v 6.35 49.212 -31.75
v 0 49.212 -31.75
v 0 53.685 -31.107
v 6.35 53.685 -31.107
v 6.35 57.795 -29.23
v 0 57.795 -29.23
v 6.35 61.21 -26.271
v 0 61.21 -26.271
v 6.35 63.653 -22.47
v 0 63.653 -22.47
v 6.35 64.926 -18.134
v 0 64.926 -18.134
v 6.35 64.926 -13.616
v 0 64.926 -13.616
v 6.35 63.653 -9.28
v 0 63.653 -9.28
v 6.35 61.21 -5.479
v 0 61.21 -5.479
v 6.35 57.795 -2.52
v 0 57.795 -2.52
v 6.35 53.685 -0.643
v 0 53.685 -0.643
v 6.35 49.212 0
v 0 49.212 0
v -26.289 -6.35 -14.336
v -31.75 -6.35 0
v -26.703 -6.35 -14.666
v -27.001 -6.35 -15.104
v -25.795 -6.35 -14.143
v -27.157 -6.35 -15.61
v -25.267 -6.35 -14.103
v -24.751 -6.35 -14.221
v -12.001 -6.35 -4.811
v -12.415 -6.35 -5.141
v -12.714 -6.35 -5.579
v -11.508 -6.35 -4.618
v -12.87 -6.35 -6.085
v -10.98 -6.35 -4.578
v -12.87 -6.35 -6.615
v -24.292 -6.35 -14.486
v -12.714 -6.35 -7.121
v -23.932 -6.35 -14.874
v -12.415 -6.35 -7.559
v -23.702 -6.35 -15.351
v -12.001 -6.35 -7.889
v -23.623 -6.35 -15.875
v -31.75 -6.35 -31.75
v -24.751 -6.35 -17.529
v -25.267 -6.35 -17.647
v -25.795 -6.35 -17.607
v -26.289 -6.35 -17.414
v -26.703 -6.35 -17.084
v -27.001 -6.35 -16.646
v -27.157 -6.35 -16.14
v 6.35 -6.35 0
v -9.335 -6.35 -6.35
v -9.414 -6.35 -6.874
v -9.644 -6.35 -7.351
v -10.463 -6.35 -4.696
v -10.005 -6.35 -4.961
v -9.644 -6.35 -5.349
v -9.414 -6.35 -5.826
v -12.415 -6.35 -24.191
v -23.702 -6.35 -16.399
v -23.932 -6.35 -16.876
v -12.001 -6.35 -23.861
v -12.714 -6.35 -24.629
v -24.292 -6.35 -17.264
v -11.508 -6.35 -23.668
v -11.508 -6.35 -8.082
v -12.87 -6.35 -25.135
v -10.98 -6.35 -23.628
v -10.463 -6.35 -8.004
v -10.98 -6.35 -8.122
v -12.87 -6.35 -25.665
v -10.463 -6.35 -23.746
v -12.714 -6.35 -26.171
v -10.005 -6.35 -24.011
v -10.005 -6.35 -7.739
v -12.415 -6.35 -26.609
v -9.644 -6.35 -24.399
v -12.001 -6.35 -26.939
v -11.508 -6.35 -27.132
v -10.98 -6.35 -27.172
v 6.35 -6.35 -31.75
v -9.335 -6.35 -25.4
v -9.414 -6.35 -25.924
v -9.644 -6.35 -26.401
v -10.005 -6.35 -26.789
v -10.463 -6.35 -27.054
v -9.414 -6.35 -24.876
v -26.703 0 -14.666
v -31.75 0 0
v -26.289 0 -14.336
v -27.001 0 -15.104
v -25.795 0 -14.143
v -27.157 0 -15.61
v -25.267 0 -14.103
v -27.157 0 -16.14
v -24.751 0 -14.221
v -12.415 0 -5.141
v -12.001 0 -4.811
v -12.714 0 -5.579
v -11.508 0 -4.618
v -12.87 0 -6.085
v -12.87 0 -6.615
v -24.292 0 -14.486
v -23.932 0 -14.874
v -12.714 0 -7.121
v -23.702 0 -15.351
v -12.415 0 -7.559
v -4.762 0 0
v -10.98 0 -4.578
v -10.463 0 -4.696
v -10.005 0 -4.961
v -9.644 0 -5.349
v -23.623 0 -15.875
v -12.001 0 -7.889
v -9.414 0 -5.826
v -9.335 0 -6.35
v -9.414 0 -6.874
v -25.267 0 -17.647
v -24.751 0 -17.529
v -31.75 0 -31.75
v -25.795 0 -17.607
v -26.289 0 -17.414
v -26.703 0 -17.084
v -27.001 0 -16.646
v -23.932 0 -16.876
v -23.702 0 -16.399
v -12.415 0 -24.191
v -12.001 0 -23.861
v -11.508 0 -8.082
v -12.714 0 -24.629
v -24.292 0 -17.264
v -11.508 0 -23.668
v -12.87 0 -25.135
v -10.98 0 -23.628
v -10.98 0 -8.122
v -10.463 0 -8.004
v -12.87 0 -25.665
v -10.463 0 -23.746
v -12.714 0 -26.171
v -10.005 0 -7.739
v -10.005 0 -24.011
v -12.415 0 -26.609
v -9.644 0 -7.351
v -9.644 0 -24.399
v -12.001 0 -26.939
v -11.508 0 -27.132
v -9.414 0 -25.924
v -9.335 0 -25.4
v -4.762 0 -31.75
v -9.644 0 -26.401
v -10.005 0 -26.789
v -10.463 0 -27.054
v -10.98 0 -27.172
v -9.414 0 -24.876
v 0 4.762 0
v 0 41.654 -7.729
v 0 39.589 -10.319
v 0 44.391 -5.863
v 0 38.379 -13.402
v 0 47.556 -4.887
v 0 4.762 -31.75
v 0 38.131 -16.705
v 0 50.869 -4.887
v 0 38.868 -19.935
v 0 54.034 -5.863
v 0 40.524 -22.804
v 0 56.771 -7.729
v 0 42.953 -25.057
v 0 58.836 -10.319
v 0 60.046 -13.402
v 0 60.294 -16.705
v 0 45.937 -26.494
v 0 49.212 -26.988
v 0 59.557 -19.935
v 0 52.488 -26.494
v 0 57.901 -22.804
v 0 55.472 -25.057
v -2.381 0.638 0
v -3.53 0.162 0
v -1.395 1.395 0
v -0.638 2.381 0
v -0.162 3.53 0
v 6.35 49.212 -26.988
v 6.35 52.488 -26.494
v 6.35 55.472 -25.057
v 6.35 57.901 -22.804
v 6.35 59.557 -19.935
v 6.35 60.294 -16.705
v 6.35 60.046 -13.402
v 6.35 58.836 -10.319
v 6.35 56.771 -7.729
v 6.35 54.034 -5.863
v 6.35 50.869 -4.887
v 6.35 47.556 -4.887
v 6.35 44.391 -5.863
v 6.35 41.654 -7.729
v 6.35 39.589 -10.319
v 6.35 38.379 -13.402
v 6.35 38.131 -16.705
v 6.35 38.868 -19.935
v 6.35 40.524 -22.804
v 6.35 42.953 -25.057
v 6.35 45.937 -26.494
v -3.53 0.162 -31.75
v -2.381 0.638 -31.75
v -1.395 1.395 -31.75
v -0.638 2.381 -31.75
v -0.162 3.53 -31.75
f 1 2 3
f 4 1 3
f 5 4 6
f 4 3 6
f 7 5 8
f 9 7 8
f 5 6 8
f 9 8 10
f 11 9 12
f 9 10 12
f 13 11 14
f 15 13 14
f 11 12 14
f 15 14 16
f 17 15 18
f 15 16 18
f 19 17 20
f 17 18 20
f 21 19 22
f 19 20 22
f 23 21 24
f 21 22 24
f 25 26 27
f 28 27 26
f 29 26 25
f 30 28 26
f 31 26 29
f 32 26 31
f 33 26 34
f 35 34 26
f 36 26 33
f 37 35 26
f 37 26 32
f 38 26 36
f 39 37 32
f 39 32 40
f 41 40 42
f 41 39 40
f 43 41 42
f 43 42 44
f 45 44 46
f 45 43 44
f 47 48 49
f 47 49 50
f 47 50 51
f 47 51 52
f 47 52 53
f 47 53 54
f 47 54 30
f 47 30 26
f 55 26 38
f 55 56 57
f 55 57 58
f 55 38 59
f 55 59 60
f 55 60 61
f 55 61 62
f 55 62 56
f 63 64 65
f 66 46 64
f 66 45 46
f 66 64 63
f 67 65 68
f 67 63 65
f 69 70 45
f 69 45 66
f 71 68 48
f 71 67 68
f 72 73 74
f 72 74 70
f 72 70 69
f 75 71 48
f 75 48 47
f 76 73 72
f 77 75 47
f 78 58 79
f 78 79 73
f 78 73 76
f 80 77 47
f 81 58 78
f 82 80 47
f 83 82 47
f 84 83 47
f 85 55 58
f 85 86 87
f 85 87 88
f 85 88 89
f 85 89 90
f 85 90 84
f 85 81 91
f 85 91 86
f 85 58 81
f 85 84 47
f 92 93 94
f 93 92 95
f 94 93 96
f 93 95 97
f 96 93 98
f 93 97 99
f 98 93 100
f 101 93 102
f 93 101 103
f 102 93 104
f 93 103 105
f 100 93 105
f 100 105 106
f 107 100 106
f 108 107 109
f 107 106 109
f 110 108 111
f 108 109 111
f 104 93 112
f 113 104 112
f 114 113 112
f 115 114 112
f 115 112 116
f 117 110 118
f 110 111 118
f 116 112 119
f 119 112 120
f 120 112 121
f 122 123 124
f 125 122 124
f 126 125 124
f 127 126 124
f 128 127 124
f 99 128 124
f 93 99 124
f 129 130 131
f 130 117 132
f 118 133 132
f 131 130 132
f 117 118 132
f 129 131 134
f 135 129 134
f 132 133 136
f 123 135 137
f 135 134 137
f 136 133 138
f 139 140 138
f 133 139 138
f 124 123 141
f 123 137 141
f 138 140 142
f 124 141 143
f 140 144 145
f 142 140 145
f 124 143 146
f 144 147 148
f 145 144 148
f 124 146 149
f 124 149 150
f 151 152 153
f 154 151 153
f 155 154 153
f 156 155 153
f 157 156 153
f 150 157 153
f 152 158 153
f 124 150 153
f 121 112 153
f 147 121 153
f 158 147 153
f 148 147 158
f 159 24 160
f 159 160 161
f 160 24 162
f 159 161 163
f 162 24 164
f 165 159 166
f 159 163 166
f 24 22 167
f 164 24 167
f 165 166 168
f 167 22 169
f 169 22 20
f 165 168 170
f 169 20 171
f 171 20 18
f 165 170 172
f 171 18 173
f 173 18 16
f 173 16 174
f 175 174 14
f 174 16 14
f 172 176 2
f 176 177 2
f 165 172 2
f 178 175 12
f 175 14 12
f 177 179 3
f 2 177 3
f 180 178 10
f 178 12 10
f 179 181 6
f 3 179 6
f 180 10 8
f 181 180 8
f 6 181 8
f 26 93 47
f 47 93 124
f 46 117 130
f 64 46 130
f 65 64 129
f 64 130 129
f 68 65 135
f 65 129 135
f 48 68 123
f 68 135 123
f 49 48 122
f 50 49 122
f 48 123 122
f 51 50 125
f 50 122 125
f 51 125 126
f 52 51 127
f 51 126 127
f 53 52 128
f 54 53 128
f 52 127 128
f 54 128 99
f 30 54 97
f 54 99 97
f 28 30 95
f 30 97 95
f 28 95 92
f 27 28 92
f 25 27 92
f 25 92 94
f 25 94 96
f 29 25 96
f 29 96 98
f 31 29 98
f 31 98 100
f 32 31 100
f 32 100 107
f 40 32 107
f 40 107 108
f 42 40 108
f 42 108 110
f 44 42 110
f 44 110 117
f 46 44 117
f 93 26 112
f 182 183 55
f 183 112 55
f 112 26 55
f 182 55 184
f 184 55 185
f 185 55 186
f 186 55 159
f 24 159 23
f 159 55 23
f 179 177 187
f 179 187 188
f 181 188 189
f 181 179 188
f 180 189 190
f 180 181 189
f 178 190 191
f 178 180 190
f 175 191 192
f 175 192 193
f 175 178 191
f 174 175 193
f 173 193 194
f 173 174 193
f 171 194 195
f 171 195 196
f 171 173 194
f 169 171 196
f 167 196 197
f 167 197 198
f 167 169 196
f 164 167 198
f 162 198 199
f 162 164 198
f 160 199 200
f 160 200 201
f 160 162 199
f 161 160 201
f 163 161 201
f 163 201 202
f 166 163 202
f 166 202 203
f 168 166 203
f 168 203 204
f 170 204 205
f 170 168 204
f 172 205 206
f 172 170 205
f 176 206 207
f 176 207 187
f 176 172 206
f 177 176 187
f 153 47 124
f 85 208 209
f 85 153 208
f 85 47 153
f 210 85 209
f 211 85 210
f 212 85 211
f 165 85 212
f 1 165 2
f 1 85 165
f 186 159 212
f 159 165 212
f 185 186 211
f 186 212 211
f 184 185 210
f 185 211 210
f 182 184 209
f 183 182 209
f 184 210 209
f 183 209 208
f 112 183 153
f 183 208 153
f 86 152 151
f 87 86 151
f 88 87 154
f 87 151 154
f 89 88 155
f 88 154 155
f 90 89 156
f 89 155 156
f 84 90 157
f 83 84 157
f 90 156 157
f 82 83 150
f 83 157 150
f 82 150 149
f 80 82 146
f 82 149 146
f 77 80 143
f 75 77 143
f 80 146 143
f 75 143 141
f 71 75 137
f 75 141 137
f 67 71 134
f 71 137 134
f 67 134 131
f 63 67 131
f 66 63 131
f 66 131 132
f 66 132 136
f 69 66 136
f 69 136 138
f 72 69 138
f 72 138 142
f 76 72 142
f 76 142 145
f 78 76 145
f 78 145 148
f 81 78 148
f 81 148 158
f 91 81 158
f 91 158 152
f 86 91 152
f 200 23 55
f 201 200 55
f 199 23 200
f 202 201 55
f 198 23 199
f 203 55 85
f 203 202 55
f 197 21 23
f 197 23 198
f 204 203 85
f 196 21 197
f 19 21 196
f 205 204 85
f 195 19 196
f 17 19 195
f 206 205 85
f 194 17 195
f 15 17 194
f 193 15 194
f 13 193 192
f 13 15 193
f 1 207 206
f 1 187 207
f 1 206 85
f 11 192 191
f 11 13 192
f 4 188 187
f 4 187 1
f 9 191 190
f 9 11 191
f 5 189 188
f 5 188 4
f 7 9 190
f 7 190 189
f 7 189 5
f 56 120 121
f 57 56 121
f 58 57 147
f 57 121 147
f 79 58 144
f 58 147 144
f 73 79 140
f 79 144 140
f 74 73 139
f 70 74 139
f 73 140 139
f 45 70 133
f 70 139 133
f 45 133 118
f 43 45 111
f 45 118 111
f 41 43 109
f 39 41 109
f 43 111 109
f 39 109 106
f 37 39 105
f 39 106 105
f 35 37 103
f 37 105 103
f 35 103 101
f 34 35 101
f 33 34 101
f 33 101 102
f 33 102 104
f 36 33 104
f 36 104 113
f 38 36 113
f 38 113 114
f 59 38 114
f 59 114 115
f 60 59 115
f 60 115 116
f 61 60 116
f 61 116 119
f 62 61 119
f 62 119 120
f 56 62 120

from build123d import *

# Parameters (mm, degrees)
SKETCH3_R           = 11.1125
BOSS_EXTRUDE1_DEPTH = 6.35
SKETCH5_W           = 31.75
SKETCH5_H           = 6.35
BOSS_EXTRUDE2_DEPTH = 38.1
FILLET1_R           = 4.7625
SKETCH6_R           = 1.777000002
CUT_EXTRUDE1_DEPTH  = 7.35


with BuildPart() as part:
    # Sketch3 → Boss-Extrude1 (new body)
    with BuildSketch(Plane(origin=(0, 0, 0), x_dir=(0, 0, -1), z_dir=(1, 0, 0))):
        with BuildLine():
            Line((0, 0), (31.75, 0))
            Line((31.75, 0), (31.75, 49.2125))
            ThreePointArc((31.75, 49.2125), (15.875, 65.0875), (0, 49.2125))
            Line((0, 49.2125), (0, 0))
        make_face()
        with Locations((15.875, 49.2125)):
            Circle(SKETCH3_R, mode=Mode.SUBTRACT)
    extrude(amount=BOSS_EXTRUDE1_DEPTH)

    # Sketch5 → Boss-Extrude2 (add)
    with BuildSketch(Plane(origin=(6.35, 0, 0), x_dir=(0, 0, -1), z_dir=(1, 0, 0))):
        with Locations((15.875, -3.175)):
            Rectangle(SKETCH5_W, SKETCH5_H)
    extrude(amount=-BOSS_EXTRUDE2_DEPTH)

    # Fillet1
    fillet1_edges = [part.edges().sort_by_distance(p)[0] for p in [
        (0, 0, -15.875),
    ]]
    fillet(fillet1_edges, radius=FILLET1_R)

    # Sketch6 → Cut-Extrude1 (cut, through all)
    with BuildSketch(Plane(origin=(0, 0, 0), x_dir=(1, 0, 0), z_dir=(0, 1, 0))):
        with Locations((-11.1125, 6.35)):
            Circle(SKETCH6_R)
        with Locations((-25.4, 15.875)):
            Circle(SKETCH6_R)
        with Locations((-11.1125, 25.4)):
            Circle(SKETCH6_R)
    extrude(amount=-CUT_EXTRUDE1_DEPTH, mode=Mode.SUBTRACT)


solid = part.part
